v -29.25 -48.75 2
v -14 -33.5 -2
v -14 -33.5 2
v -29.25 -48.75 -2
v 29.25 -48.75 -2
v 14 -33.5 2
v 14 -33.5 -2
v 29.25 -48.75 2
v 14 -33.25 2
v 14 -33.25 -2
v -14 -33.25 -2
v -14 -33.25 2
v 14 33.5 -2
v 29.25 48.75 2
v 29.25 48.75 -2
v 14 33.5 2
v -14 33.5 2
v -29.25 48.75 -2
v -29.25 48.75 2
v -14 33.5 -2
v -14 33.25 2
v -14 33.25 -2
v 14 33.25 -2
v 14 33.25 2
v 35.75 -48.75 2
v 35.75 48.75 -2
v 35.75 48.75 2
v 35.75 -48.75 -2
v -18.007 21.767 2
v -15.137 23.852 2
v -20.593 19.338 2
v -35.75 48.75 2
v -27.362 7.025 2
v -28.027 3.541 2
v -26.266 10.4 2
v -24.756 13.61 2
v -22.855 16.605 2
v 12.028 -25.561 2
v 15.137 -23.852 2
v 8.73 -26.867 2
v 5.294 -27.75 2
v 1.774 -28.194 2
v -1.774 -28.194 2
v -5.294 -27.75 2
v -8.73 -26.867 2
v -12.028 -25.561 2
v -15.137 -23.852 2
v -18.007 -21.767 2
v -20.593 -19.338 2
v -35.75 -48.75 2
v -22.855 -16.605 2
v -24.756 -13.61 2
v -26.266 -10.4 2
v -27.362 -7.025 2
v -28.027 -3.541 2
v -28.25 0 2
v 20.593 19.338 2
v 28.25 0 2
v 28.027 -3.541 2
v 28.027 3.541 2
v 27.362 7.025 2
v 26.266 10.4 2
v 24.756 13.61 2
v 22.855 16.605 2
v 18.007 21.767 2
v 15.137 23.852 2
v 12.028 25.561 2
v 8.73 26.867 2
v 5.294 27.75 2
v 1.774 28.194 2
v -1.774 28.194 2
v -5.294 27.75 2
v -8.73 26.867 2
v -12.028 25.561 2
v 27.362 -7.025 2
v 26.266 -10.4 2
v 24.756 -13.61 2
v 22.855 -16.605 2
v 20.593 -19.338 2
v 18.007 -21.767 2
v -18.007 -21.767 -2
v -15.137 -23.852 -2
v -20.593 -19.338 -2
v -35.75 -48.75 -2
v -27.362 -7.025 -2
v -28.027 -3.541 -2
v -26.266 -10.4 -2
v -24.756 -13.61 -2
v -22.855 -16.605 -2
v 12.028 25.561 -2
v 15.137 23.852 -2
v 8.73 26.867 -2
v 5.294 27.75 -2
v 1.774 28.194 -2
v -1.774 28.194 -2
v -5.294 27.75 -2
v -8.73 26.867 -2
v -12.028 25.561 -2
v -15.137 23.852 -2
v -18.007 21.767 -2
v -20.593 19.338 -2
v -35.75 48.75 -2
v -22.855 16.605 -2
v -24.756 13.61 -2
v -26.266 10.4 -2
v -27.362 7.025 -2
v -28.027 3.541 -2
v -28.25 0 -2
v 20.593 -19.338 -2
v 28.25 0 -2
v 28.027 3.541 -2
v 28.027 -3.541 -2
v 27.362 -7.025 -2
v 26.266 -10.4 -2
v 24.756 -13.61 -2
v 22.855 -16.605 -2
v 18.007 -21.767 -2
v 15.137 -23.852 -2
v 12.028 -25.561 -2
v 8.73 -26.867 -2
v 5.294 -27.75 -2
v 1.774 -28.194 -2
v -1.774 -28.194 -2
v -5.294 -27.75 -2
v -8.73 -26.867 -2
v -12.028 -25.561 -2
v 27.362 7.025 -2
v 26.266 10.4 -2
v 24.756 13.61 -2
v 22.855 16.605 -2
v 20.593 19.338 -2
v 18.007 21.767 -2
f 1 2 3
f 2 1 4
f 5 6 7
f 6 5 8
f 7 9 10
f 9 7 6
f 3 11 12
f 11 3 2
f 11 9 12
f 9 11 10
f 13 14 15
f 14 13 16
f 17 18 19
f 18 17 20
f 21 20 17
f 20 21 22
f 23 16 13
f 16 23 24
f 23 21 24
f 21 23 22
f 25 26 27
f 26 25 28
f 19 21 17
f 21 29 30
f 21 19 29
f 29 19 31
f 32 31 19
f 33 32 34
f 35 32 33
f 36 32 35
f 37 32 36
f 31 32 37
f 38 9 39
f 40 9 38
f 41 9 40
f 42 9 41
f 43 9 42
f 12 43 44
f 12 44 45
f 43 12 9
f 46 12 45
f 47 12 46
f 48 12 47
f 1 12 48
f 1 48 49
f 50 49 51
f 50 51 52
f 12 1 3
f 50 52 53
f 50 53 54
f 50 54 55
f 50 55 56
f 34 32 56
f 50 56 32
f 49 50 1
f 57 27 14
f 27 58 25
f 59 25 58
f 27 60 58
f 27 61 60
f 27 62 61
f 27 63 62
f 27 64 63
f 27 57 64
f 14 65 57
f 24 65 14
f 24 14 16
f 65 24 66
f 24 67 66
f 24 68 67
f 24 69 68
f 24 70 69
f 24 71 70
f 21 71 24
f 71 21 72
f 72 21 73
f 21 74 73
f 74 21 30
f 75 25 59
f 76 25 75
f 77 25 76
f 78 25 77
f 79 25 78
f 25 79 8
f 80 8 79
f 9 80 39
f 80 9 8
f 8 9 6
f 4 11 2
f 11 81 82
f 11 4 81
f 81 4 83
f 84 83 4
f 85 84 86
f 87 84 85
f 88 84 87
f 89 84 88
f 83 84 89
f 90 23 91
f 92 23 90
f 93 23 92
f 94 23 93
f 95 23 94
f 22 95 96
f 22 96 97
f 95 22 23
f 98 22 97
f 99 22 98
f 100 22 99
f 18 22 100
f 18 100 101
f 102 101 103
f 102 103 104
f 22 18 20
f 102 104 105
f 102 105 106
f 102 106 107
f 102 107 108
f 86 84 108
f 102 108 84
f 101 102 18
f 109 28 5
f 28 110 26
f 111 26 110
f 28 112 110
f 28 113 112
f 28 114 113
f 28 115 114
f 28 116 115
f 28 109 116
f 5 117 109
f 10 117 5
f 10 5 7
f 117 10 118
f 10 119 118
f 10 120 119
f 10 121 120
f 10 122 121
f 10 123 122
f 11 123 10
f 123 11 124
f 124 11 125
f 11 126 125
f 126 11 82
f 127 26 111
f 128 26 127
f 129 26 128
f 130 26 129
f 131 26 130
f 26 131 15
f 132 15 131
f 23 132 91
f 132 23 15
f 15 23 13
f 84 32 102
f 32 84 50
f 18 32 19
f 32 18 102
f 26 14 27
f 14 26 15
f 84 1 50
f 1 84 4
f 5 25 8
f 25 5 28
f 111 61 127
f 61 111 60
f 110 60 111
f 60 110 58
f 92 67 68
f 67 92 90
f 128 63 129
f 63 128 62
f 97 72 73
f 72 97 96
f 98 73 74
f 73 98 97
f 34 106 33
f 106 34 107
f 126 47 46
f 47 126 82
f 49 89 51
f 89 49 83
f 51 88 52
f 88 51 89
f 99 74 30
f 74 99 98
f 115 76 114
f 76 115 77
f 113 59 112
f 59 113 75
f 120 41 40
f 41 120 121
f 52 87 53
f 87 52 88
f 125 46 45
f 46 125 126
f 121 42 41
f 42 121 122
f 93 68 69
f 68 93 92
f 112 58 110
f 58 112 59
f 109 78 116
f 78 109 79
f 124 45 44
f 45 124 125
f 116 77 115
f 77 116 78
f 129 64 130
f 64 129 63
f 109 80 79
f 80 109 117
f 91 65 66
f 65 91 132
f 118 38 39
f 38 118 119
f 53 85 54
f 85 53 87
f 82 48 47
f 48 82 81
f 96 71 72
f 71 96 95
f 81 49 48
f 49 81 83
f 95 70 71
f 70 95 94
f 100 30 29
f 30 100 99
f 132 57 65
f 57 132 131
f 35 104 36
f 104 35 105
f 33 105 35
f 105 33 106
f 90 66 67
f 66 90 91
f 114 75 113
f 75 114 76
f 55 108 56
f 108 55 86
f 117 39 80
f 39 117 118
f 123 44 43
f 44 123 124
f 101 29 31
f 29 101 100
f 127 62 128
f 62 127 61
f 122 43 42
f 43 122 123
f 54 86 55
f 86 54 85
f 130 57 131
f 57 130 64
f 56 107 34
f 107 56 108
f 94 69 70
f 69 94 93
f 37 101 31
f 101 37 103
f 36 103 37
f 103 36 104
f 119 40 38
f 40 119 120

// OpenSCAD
// file: ../mods/half_cube.scad
/*
 * module: half_cube
 *         This module generates a triangular prism taking a half of a
 *         cube defined by xy_dim and z_dim parameters. Using cut = 50,
 *         the cutting line will go from a vertex to the opposite one.
 *
 * author: Felipe Torres González<torresfelipex1@gmail.com>
 * date: 20220319
 * version: 1.0
 */
module half_cube( xy_dim, z_dim, cut = 50 ) {
    difference() {
        cube( [ xy_dim, xy_dim, z_dim ], center = true );
        rotate([0,0,45])
        translate([xy_dim*cut/100, 0, 0])
        cube( [ xy_dim, xy_dim*2, z_dim+4 ], center = true );
    }
}
// main file
/*
 * planter_holder.scad
 * ===================
 *
 * This design aims to be used as a holder for yogurt containers. In Spain, regular
 * yogurt containers are perfect for growing seeds. The idea is to have some sort
 * of structure that can hold many of this things to build a seedbed.
 *
 * author: Felipe Torres González<torresfelipex1@gmail.com>
 * date: 20220319
 * version: 1.0
 */

use <../mods/half_cube.scad>

/*
 * Generic parameters
 * ==================
 *
*/
// Dimension tolerance. Applied to all dimensions that interact with external objects.
g_TOLERANCE = 0.5;
// X&Y Scaling factor. Easily scale the entire model along X&Y axis.
g_XYSCALE_FACTOR = 1.0;

/*
 * Planter shape
 * =============
 * 
 * Define the dimensions of the planter.
 *
 */
// External diameter of the planter
plt_external_d = 56;
// Border size of the wings (minimum)
plt_border = 5;

/*
 * Holder definitions
 *
 */
// Borders height of the object
hldr_border_ht = 3.5;
// X size of the lateral wings
hldr_xwing_size = plt_border + 2;
// Y size of the lateral wings
hldr_ywing_size = plt_border + 15;

/*
 * Customization of the Y wings
 */
// Size of the bevel
bevel_cube_size = 15;
// Distance from the X wing border to the start of the bevel
hldr_corner = 6;


/* 
 * ADJUST(x): Applies the tolerance value and the scaling factor
 */

function XYADJUST(x) = (x + g_TOLERANCE) * g_XYSCALE_FACTOR;
function ZADJUST(x) = (x + g_TOLERANCE);

/*
 * module: holder_shaper
 *         This module defines the shape of the cut to be given to the
 *         Y wing of the plant holder. 
 *         Requires the module `half_cube`.
 */
module holder_shaper ( length, width, heigth, cut = 50 ) {
    union() {
        color("grey", 1.0)
        translate([
            -length+width/2,
            0,
            0])
        rotate([0,0,90])
        half_cube(width,heigth+2);

        color("grey", 1.0)
        translate([
            length-width/2,
            0,
            0])
        rotate([0,0,0])
        half_cube(width,heigth+2);

        color("grey", 1.0)
        translate([0,0,0])
        cube([
            length*2-width*2+0.5, 
            width, 
            heigth+2], 
            center = true);
    }
}




i_plt_external_d = XYADJUST(plt_external_d);
i_hldr_border_ht = ZADJUST(hldr_border_ht);
i_hldr_xwing_size = XYADJUST(hldr_xwing_size);
i_hldr_ywing_size = XYADJUST(hldr_ywing_size);

$fn = 50;


i_hldr_external_x_size = i_plt_external_d + i_hldr_xwing_size * 2;
i_hldr_external_y_size = i_plt_external_d + i_hldr_ywing_size * 2;
i_half_holder_x_size = i_hldr_external_x_size/2;
i_half_holder_y_size = i_hldr_external_y_size/2;

difference() {
    // Part design
    cube([i_hldr_external_x_size,
          i_hldr_external_y_size,
          i_hldr_border_ht], 
          center = true
    );
    
    i_bevel_cube_size = bevel_cube_size;
    i_hldr_corner = hldr_corner;

    // Ghost part: planter
    color("grey", 1.0)
    cylinder(h = i_hldr_border_ht+4, r = i_plt_external_d/2, center = true);

    translate([0,-i_half_holder_y_size+i_bevel_cube_size/2, 0])
    holder_shaper( i_half_holder_x_size-i_hldr_corner, 
                   i_bevel_cube_size+1, 
                   hldr_border_ht );

    translate([0,i_half_holder_y_size-i_bevel_cube_size/2, 0])
    rotate([0,0,180])
    holder_shaper( i_half_holder_x_size-i_hldr_corner, 
                   i_bevel_cube_size+1, 
                   hldr_border_ht );   
}
